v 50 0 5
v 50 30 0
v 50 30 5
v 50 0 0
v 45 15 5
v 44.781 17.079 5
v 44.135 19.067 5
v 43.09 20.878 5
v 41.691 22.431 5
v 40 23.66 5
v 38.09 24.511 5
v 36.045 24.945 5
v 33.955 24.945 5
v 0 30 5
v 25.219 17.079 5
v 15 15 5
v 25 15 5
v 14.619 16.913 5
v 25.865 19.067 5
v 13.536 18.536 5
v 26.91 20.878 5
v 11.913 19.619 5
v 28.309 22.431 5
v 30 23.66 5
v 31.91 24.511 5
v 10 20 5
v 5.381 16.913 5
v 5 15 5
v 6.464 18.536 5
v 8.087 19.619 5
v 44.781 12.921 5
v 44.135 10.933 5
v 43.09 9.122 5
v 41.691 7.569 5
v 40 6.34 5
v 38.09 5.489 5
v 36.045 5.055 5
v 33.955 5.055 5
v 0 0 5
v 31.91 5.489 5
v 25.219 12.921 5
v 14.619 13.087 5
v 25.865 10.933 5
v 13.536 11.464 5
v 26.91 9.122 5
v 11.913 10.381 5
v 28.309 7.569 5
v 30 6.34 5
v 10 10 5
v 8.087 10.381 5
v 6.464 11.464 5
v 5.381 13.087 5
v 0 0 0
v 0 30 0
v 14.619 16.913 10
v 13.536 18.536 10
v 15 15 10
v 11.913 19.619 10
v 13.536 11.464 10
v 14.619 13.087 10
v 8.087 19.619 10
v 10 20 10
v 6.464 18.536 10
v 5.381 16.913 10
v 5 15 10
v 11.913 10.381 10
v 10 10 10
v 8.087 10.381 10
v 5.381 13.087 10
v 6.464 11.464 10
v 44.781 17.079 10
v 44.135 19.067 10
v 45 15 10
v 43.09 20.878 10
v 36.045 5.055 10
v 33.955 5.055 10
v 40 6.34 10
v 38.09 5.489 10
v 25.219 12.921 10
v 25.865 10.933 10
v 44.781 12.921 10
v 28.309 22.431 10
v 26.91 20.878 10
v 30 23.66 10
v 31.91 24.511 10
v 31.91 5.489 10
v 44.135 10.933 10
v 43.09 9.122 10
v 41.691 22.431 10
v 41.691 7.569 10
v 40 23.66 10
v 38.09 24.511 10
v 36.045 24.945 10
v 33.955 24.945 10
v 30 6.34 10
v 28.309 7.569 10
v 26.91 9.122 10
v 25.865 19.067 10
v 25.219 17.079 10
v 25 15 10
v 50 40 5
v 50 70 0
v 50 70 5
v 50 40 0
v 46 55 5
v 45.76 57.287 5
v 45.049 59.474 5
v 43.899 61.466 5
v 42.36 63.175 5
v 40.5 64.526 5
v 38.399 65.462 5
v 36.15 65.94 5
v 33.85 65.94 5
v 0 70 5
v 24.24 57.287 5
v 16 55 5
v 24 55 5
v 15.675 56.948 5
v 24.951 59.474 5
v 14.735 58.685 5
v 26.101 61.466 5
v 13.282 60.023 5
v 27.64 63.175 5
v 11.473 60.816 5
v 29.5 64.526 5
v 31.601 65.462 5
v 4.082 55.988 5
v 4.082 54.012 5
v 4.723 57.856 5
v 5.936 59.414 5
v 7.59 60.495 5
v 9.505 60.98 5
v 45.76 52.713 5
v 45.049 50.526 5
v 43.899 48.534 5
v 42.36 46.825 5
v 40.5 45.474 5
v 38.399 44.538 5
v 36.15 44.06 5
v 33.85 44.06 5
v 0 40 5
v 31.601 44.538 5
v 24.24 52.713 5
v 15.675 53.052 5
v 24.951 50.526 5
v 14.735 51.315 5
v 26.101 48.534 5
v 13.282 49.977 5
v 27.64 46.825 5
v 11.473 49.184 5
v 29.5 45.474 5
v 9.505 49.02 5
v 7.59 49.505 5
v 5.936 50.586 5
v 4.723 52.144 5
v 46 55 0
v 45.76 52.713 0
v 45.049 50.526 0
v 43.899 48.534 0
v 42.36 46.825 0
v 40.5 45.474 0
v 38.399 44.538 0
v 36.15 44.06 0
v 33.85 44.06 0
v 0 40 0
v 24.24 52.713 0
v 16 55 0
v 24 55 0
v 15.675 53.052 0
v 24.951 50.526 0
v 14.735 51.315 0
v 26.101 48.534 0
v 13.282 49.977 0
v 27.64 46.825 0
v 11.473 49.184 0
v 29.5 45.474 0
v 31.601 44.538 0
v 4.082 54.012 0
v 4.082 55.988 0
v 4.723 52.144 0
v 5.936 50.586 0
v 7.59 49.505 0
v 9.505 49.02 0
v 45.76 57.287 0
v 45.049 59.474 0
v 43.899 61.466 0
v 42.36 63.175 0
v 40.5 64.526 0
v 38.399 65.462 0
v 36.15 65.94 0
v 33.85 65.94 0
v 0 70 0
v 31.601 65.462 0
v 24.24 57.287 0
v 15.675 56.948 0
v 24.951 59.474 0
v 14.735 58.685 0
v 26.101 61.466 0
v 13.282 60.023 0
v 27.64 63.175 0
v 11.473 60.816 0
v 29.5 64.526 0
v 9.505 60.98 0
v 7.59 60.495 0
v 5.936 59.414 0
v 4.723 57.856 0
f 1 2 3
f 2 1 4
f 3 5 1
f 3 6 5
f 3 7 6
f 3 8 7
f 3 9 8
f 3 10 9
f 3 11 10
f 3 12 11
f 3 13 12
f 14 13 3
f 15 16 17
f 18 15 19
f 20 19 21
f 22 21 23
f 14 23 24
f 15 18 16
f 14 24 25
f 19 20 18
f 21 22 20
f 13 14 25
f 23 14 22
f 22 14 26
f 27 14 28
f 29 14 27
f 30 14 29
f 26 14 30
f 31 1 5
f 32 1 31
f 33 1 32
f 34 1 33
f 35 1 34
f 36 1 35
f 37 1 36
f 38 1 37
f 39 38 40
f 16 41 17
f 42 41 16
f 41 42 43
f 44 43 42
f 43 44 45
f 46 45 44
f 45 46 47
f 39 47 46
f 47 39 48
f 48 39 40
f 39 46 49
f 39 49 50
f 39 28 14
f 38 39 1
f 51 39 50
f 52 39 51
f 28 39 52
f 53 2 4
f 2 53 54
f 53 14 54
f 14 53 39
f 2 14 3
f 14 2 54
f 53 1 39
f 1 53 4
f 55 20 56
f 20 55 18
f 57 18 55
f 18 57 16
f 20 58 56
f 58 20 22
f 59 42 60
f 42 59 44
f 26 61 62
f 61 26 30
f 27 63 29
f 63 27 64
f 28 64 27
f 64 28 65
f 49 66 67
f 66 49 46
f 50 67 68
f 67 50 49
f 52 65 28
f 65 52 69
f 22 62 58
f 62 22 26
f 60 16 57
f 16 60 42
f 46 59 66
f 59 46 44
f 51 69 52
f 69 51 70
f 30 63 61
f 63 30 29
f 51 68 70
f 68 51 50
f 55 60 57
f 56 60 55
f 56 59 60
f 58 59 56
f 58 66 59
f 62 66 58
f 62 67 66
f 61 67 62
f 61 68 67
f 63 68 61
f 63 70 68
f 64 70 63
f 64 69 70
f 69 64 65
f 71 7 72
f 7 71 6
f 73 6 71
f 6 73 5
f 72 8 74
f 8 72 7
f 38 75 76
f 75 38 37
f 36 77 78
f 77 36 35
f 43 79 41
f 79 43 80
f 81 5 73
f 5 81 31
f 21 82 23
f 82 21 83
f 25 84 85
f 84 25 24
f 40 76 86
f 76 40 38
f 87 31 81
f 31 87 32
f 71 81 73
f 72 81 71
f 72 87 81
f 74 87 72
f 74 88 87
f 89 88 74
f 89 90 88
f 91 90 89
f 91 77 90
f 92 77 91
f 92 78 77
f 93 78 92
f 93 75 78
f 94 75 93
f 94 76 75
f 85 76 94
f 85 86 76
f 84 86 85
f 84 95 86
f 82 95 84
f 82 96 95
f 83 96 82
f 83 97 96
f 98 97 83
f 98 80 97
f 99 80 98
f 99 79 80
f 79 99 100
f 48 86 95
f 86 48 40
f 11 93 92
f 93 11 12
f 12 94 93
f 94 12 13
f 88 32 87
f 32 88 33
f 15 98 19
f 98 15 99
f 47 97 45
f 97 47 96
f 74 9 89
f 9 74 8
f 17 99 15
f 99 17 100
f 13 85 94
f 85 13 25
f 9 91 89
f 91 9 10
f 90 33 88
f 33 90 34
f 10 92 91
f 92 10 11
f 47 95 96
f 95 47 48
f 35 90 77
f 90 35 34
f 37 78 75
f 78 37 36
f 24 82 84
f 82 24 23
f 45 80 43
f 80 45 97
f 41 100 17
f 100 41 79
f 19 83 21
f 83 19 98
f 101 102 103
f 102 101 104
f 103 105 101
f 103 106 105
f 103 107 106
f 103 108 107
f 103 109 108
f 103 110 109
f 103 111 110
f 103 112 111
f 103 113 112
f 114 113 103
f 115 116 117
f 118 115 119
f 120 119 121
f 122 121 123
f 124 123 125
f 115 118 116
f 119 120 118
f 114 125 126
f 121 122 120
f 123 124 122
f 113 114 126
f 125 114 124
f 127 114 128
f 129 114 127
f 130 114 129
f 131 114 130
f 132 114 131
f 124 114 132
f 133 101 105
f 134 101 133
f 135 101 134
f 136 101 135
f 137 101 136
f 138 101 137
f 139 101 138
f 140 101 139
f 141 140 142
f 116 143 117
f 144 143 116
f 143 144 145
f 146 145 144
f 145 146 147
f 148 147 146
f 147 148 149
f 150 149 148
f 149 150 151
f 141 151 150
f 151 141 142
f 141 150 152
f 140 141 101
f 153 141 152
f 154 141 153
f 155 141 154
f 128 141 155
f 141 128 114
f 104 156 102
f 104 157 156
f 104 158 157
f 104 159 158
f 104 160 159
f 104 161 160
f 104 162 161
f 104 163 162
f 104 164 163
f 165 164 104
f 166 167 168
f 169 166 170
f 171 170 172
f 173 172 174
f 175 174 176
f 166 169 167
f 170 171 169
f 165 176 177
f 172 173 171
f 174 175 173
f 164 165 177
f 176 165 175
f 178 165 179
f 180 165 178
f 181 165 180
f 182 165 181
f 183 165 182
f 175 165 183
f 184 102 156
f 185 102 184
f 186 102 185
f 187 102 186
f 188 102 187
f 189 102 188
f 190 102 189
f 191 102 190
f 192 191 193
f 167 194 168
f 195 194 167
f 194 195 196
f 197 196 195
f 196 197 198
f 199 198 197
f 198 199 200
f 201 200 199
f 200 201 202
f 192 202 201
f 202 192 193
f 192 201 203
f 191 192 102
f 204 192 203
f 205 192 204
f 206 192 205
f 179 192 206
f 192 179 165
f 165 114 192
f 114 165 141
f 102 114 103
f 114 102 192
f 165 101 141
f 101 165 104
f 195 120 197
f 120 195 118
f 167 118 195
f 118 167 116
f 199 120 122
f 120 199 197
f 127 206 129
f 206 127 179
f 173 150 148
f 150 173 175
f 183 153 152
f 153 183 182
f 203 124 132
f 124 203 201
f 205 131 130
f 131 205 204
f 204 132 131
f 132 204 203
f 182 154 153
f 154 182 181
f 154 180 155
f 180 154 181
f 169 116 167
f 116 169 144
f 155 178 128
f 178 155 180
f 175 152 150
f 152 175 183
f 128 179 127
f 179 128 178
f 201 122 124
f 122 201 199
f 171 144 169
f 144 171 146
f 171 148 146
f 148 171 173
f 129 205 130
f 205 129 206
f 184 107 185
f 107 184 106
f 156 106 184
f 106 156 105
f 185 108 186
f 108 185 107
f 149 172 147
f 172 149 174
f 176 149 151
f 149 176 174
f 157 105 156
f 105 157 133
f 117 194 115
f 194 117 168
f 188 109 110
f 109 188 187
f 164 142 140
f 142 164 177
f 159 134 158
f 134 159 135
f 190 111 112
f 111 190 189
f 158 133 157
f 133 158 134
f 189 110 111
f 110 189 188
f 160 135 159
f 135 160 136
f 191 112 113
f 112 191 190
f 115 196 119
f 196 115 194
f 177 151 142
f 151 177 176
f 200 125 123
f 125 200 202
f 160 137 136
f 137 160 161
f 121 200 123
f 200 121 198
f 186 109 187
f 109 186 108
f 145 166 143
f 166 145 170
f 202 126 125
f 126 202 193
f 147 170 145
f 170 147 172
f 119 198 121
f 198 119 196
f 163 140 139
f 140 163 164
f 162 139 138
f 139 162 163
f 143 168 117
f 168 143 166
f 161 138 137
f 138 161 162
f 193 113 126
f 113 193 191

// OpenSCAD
// 3D Shapes- Hole and Pin Test

// Pins
union() {
    cube([50, 30, 5]);
    translate([10, 15, 0]) cylinder(h=10, r1=5, r2=5);
    translate([35, 15, 0]) cylinder(h=10, r1=10, r2=10);
}

// Holes
translate([0, 40, 0]) difference() {
    cube([50, 30, 5]);
    translate([10, 15, -1]) cylinder(h=10, r1=6, r2=6);
    translate([35, 15, -1]) cylinder(h=10, r1=11, r2=11);
}
